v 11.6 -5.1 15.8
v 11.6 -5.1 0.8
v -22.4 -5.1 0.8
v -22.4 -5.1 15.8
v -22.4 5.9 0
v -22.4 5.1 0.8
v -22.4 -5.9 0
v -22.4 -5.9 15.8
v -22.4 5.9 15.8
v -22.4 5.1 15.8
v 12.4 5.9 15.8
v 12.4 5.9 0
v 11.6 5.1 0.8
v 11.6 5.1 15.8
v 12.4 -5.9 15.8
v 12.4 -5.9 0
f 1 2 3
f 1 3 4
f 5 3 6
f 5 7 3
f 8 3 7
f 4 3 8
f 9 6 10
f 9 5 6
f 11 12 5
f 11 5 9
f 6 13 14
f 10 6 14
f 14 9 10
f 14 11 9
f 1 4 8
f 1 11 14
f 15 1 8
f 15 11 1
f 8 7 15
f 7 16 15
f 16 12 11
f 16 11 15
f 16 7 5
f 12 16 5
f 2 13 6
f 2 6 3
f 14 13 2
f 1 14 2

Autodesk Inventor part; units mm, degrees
ref_plane "YZ Plane" through (0, 0, 0) normal (1, 0, 0) x (0, 1, 0)
ref_plane "XZ Plane" through (0, 0, 0) normal (0, 1, 0) x (-1, 0, 0)
ref_plane "XY Plane" through (0, 0, 0) normal (0, 0, 1) x (1, 0, 0)
sketch "Sketch6" plane through (0, 0, 0) normal (0, 0, 1) x (1, 0, 0)
  line L0 (-12.4, 5.9) -> (12.4, 5.9)
  line L1 (12.4, 5.9) -> (12.4, -5.9)
  line L2 (12.4, -5.9) -> (-12.4, -5.9)
  line L3 (-12.4, -5.9) -> (-12.4, 5.9)
  point P0 (0, 0)
  point P1 (-12.4, 0)
  point P2 (0, 5.9)
  dimension "d85" = 11.8
  dimension "d86" = 24.8
extrude "Extrusion3" add sketch "Sketch6" along normal blind 0.8
sketch "Sketch7" plane through (0, 0, 0.8) normal (0, 0, 1) x (1, 0, 0)
  point P0 (0, 0)
sketch "Sketch8" plane through (0, 0, 0.8) normal (0, 0, 1) x (1, 0, 0)
  line L0 (12.4, 5.9) -> (-12.4, 5.9) projected
  line L1 (-12.4, -5.9) -> (12.4, -5.9) projected
  line L2 (-12.4, 5.9) -> (-10.5276, 5.9)
  line L3 (-10.5276, -5.9) -> (-12.4, -5.9)
  line L4 (-12.4, -5.9) -> (-12.4, 5.9)
  line L5 (12.4, -5.9) -> (-10.5276, -5.9)
  line L6 (12.4163, 5.9) -> (10.7456, 5.9)
  line L7 (-12.4, 5.1) -> (11.6, 5.1)
  line L8 (11.6, 5.1) -> (11.6, -5.1)
  line L9 (11.6, -5.1) -> (-12.4, -5.1)
  line L10 (12.4, -5.9) -> (12.4, 5.9) projected
  point P0 (0, 0)
  dimension "d89" = 0.8
  dimension "d91" = 0.8
  dimension "d92" = 0.8
extrude "Extrusion4" add sketch "Sketch8" along normal blind 15 contours L10 L1 L4 L9 L8 L7 L0
sketch "Sketch9" plane through (-12.4, -5.9, 0) normal (-1, 0, 0) x (0, 0, 1)
  line L0 (0, 11.8) -> (15.8, 11.8) projected
  line L1 (0.8, 11) -> (15.8, 11) projected
  line L2 (15.8, 11.8) -> (15.8, 11)
  line L3 (15.8, 11) -> (0.8, 11)
  line L4 (0.8, 0.8) -> (15.8, 0.8) projected
  line L5 (0.8, 11) -> (0.8, 0.8)
  line L6 (0.8, 0.8) -> (15.8, 0.8)
  line L7 (0, 0) -> (15.8, 0) projected
  line L8 (15.8, 0.8) -> (15.8, 0)
  line L9 (15.8, 0) -> (0, 0)
  line L10 (0, 0) -> (0, 11.8)
  line L11 (0, 11.8) -> (15.8, 11.8)
  point P0 (0, 5.9)
  dimension "d95" = 0.8
extrude "Extrusion5" add sketch "Sketch9" along normal blind 10
properties part number "emax box"
